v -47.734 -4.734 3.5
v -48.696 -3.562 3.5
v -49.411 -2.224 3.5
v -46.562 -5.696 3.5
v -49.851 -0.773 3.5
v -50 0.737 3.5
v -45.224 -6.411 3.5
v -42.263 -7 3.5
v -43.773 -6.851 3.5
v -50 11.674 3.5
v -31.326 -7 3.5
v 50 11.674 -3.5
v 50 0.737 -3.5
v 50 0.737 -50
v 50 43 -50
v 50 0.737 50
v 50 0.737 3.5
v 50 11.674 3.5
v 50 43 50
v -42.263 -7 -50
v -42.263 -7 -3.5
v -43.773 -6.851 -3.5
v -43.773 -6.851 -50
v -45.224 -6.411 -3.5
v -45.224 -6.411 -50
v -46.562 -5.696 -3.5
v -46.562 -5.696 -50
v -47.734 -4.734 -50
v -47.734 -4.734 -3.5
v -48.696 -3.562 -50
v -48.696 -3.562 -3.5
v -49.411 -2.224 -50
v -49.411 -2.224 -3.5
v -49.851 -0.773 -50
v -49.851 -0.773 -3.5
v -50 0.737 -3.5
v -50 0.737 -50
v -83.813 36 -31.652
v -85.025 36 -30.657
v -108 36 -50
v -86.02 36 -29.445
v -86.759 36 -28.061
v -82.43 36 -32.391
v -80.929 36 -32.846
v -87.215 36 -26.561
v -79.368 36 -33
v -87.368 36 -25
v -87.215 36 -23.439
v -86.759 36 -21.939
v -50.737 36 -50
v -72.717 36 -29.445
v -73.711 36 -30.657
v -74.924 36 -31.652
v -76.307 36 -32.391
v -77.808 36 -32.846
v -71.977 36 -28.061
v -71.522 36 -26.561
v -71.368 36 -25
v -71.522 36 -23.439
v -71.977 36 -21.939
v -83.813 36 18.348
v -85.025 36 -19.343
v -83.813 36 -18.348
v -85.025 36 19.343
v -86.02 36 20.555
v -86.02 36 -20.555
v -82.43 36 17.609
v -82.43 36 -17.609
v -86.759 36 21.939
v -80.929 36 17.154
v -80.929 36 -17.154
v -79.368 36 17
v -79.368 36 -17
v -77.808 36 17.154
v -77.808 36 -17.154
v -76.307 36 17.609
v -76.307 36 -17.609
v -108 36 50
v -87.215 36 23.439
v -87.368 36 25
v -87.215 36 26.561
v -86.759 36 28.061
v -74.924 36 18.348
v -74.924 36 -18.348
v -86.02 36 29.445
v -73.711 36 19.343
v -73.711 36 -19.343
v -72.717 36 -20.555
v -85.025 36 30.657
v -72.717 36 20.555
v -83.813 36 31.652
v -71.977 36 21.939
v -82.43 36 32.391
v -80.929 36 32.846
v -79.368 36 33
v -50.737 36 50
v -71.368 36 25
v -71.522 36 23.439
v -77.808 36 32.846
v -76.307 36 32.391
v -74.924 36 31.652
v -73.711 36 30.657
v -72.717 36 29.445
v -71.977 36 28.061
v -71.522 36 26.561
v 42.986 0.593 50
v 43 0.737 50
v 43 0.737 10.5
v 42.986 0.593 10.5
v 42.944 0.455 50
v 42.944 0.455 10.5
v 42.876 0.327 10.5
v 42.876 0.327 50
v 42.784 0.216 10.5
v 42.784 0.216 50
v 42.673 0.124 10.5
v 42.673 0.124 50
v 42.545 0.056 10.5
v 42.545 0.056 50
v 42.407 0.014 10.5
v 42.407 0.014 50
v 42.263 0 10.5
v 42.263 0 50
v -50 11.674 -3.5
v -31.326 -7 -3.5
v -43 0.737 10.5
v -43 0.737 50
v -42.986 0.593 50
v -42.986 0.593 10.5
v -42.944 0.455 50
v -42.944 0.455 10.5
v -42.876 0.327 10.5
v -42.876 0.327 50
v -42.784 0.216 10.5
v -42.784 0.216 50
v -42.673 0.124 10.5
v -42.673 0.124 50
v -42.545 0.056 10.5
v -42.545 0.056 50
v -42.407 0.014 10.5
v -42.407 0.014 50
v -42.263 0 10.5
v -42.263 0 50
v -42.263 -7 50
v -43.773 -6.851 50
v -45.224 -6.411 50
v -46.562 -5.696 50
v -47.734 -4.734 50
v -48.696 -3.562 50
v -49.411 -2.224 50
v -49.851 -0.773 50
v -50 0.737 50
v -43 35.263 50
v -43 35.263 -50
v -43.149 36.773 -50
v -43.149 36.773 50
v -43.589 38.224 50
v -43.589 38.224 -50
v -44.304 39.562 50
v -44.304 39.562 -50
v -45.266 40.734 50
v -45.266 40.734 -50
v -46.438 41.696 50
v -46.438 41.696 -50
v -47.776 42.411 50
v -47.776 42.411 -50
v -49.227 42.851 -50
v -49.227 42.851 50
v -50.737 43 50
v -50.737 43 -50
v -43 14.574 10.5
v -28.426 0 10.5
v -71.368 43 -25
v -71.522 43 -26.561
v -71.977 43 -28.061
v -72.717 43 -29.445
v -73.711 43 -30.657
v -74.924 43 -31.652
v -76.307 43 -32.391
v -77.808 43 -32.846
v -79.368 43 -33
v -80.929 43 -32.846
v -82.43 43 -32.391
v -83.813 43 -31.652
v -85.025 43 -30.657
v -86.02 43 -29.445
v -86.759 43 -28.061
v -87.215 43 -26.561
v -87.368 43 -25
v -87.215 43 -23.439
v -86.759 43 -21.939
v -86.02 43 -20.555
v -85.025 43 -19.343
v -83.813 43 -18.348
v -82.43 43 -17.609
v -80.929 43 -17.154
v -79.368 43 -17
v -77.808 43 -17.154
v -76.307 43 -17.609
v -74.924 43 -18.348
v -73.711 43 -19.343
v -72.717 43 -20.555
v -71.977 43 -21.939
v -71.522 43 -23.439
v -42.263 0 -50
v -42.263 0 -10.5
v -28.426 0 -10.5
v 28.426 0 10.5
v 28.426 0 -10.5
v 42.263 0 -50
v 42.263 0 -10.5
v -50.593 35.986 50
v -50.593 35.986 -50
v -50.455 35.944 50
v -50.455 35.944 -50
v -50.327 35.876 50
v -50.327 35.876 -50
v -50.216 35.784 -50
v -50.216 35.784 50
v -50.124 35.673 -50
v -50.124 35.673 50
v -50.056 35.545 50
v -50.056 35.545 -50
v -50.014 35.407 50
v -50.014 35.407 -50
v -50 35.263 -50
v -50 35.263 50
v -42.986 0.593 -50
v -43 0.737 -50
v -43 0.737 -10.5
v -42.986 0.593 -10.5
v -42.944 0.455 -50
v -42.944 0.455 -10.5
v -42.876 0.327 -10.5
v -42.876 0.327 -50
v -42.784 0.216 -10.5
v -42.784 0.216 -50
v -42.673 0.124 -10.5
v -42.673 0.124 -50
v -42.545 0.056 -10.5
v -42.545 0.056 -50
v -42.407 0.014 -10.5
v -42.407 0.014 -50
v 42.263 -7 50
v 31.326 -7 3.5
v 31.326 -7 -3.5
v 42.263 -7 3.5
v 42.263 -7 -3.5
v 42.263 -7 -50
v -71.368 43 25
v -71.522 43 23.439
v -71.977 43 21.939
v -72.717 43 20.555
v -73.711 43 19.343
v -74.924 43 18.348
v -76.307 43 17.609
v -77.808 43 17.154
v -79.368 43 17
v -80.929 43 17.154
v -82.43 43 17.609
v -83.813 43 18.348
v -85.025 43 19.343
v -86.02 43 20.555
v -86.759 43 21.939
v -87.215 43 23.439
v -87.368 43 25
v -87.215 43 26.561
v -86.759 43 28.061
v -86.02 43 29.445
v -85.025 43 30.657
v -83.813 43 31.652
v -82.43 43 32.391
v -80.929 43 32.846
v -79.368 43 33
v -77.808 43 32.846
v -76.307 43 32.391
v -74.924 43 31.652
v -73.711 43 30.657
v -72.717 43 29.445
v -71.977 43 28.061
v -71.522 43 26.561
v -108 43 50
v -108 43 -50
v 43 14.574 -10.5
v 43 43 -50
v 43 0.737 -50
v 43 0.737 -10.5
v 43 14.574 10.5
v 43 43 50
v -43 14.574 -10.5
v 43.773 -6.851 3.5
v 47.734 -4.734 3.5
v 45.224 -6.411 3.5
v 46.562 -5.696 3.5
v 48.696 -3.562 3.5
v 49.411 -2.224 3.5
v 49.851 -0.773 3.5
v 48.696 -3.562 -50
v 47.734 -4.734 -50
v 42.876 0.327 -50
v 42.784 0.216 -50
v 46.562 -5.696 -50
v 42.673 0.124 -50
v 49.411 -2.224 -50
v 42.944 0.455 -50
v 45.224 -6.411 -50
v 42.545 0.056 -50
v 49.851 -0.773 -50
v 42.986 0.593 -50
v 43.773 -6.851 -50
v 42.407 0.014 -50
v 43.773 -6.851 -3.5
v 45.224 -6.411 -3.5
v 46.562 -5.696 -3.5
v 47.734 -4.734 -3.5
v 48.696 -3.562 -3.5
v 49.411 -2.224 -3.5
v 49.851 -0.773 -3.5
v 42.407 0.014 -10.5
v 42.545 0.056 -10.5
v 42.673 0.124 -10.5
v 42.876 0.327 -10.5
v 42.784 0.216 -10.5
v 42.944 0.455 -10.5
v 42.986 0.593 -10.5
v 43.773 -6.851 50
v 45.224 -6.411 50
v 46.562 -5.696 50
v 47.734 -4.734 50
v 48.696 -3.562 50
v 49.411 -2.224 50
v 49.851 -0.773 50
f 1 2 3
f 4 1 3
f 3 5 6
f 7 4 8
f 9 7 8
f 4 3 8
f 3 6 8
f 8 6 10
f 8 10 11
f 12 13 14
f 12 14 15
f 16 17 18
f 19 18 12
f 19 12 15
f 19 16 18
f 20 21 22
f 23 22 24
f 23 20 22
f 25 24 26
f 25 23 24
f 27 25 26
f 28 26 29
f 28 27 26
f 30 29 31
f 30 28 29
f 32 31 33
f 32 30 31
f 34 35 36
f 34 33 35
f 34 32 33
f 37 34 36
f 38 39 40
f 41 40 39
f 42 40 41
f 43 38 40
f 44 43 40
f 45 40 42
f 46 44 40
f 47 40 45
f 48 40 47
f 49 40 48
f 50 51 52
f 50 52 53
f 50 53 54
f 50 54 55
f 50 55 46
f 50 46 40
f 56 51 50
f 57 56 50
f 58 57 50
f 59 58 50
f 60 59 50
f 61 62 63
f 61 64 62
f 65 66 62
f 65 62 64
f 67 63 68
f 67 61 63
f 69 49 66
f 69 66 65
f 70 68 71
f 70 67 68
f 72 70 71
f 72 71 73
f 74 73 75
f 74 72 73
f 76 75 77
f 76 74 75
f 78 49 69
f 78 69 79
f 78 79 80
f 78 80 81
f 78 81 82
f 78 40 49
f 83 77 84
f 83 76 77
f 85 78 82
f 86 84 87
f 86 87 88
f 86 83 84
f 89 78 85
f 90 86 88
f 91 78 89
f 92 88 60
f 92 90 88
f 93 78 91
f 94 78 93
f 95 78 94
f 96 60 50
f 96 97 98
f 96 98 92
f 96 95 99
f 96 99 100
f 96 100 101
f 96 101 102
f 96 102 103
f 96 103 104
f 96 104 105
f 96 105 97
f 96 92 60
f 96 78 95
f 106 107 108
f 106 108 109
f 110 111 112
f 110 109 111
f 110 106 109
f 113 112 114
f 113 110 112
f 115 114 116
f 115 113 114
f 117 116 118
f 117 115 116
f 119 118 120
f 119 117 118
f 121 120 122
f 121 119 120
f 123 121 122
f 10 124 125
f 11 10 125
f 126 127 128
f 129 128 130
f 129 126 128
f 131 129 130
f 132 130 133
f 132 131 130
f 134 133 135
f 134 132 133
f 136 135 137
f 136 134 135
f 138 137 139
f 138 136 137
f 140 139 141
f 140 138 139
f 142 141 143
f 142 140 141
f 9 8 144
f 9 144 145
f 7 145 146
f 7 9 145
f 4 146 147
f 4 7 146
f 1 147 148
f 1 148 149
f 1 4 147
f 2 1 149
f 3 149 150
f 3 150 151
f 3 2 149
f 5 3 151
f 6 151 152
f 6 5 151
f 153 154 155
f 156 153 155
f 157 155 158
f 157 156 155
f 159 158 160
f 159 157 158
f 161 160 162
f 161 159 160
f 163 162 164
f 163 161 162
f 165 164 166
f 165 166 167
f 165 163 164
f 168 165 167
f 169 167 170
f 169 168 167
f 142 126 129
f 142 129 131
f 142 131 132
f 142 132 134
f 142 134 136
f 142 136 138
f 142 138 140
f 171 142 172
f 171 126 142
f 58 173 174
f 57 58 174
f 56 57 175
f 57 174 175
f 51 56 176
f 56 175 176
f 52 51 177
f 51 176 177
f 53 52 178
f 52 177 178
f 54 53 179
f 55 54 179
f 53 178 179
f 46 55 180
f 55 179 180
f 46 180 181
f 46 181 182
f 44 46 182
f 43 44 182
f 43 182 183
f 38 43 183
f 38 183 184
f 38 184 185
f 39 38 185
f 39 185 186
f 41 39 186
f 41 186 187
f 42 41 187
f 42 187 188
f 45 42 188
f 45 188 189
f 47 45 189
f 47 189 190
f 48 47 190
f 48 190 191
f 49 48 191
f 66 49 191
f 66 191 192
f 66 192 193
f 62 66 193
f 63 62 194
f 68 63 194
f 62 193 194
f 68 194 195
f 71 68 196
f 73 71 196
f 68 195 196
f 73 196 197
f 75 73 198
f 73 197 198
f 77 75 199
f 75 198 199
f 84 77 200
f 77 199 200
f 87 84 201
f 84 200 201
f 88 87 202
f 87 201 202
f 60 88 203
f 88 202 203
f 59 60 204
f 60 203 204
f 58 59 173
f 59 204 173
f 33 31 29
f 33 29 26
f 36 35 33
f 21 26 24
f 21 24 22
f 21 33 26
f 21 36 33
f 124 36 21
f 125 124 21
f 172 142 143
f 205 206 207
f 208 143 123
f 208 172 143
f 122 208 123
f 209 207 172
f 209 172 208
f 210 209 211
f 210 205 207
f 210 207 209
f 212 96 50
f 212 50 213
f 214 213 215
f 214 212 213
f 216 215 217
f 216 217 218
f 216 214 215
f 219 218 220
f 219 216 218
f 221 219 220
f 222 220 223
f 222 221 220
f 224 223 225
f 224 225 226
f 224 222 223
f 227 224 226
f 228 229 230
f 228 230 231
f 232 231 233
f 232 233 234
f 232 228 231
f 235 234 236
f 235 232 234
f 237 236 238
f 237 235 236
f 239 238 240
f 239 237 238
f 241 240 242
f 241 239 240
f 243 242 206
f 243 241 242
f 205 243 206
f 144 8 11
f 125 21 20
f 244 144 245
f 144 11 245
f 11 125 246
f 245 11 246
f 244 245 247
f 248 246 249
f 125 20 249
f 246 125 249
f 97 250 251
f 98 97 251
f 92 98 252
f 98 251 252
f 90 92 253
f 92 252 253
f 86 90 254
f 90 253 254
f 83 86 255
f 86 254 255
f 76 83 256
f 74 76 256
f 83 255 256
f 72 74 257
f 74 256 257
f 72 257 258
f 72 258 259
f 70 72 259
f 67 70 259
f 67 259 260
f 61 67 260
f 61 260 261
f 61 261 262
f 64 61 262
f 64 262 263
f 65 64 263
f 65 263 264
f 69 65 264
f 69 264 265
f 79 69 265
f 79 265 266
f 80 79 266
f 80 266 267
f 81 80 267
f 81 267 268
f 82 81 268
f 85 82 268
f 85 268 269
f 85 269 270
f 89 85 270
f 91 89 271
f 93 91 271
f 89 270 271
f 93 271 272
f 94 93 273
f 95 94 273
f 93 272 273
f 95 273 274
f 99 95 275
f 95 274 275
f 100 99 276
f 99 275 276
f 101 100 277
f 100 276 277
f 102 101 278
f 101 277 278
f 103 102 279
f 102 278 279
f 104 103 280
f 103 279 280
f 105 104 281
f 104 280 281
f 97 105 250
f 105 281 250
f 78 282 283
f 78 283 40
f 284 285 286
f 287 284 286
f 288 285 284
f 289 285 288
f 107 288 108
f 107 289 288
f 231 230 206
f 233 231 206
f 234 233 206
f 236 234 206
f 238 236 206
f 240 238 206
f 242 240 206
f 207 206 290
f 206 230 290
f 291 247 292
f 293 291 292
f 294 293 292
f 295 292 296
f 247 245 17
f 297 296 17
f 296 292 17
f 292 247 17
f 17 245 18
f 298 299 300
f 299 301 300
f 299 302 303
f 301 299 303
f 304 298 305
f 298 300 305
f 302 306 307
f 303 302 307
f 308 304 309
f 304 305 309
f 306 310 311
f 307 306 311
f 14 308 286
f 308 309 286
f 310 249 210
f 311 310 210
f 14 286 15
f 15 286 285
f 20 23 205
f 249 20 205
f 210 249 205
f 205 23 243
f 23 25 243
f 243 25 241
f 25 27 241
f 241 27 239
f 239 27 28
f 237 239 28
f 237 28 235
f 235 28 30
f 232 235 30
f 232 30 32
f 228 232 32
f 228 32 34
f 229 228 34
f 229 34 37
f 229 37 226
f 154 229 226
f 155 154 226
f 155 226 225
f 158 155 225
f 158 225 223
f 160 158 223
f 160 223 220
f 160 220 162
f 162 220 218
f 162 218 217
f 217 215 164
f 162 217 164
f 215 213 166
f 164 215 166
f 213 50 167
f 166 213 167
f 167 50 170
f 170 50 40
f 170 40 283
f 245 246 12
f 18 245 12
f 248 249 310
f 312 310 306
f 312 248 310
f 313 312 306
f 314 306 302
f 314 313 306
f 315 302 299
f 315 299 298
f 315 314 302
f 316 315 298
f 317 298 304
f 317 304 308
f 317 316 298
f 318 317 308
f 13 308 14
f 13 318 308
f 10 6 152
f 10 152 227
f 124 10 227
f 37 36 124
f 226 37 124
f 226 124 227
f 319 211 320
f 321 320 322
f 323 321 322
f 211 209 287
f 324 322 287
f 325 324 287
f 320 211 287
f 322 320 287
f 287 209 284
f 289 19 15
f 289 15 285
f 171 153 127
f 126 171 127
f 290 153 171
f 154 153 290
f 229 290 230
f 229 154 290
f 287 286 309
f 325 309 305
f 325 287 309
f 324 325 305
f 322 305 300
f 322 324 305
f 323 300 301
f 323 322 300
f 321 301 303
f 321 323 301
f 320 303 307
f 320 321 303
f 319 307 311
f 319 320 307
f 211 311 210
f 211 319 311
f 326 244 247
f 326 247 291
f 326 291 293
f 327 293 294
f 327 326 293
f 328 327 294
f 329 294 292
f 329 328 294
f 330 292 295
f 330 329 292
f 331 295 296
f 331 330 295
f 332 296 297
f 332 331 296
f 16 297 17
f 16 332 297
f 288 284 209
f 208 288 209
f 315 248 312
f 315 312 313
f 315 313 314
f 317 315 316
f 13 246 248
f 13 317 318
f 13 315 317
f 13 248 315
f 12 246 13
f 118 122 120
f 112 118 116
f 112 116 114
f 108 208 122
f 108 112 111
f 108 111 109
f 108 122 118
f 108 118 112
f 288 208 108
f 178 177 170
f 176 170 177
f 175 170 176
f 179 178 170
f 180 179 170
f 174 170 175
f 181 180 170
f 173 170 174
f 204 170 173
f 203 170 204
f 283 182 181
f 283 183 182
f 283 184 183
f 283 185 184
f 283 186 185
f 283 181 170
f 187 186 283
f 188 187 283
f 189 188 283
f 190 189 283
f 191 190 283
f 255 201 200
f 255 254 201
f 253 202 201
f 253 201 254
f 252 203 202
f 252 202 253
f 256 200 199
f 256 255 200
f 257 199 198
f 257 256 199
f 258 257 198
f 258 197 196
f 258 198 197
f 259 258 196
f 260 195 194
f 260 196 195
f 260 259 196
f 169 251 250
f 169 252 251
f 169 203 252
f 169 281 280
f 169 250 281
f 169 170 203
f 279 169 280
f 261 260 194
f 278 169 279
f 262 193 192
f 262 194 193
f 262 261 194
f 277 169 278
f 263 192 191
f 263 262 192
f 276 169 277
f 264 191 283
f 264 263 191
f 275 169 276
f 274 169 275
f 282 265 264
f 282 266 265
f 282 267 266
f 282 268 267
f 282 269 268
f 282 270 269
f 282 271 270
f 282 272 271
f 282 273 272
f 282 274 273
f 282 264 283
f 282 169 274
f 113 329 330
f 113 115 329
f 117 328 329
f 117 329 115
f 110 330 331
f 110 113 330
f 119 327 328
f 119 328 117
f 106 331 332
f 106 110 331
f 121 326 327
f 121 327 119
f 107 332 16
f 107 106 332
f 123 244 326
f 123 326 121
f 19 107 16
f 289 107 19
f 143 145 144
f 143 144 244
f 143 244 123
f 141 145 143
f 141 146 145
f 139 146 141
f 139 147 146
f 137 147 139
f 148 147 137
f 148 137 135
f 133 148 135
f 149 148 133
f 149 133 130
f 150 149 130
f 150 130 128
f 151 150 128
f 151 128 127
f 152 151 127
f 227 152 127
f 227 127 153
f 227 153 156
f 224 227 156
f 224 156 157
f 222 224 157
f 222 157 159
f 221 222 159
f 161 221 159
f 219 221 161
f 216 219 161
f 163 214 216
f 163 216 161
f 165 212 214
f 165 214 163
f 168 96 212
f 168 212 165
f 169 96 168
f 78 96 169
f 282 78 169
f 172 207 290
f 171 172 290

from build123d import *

# Parameters (mm, degrees)
SKETCH1_W                      = 100
SKETCH1_H                      = 100
BASE_FLANGE1_DEPTH             = 7
EDGE_FLANGE1_STRIP_W           = 29.4732
EDGE_FLANGE1_STRIP_H           = 7
EDGE_FLANGE1_STRIP_CUT_DEPTH   = 100
EDGE_FLANGE1_STRIP_2_W         = 29.4732
EDGE_FLANGE1_STRIP_2_H         = 7
EDGE_FLANGE1_STRIP_CUT_2_DEPTH = 100
EDGE_FLANGE1_DEPTH             = 100
EDGE_FLANGE1_BEND_DEPTH        = 100
SHEET_START                    = -3.5
SHEET_METAL_GUSSET13_DEPTH     = 7
SHEET_START_2                  = -10.5
SHEET_METAL_GUSSET13_2_DEPTH   = 21
SHEET_METAL_GUSSET13_3_DEPTH   = 7
SHEET_START_3                  = 3.5
SHEET_METAL_GUSSET13_4_DEPTH   = 7
SHEET_METAL_GUSSET14_DEPTH     = 7
SHEET_METAL_GUSSET14_2_DEPTH   = 21
SHEET_METAL_GUSSET14_3_DEPTH   = 7
SHEET_METAL_GUSSET14_4_DEPTH   = 7
EDGE_FLANGE3_STRIP_W           = 29.4732
EDGE_FLANGE3_STRIP_H           = 7
EDGE_FLANGE3_STRIP_CUT_DEPTH   = 100
EDGE_FLANGE3_DEPTH             = 100
F_16_0MM_DOWEL_HOLE1_D         = 16


# Read off the part's stored shape, not the designer's step: Sheet Metal Gusset13, Sheet Metal Gusset14
# Sheet-metal steps are written as plain solids
with BuildPart() as part:
    # Sketch1 → Base-Flange1 (new body)
    with BuildSketch(Plane(origin=(0, 0, 0), x_dir=(1, 0, 0), z_dir=(0, 1, 0))):
        Rectangle(SKETCH1_W, SKETCH1_H)
    extrude(amount=-BASE_FLANGE1_DEPTH)

    # Edge-Flange1 strip (across the edge) → Edge-Flange1 strip cut (cut)
    with BuildSketch(Plane(origin=(-50, 0, -50), x_dir=(1, 0, 0), z_dir=(0, 0, 1))):
        with Locations((-7, -3.5)):
            Rectangle(EDGE_FLANGE1_STRIP_W, EDGE_FLANGE1_STRIP_H)
    extrude(amount=EDGE_FLANGE1_STRIP_CUT_DEPTH, mode=Mode.SUBTRACT)

    # Edge-Flange1 strip 2 (across the edge) → Edge-Flange1 strip cut 2 (cut)
    with BuildSketch(Plane(origin=(50, 0, 50), x_dir=(-1, 0, 0), z_dir=(0, 0, -1))):
        with Locations((-7, -3.5)):
            Rectangle(EDGE_FLANGE1_STRIP_2_W, EDGE_FLANGE1_STRIP_2_H)
    extrude(amount=EDGE_FLANGE1_STRIP_CUT_2_DEPTH, mode=Mode.SUBTRACT)

    # Edge-Flange1 section (across the edge) → Edge-Flange1 (add)
    with BuildSketch(Plane(origin=(-50, 0, -50), x_dir=(1, 0, 0), z_dir=(0, 0, 1))):
        with BuildLine():
            Line((0, 0.7366), (0, 43))
            Line((0, 43), (7, 43))
            Line((7, 43), (7, 0.7366))
            ThreePointArc((7, 0.7366), (7.215745145, 0.215745145), (7.7366, 0))
            Line((7.7366, 0), (7.7366, -7))
            ThreePointArc((7.7366, -7), (2.265997677, -4.734002323), (0, 0.7366))
        make_face()
    extrude(amount=EDGE_FLANGE1_DEPTH)

    # Edge-Flange1 section 2 (across the edge) → Edge-Flange1 bend (add)
    with BuildSketch(Plane(origin=(50, 0, 50), x_dir=(-1, 0, 0), z_dir=(0, 0, -1))):
        with BuildLine():
            Line((0, 0.7366), (0, 43))
            Line((0, 43), (7, 43))
            Line((7, 43), (7, 0.7366))
            ThreePointArc((7, 0.7366), (7.215745145, 0.215745145), (7.7366, 0))
            Line((7.7366, 0), (7.7366, -7))
            ThreePointArc((7.7366, -7), (2.265997677, -4.734002323), (0, 0.7366))
        make_face()
    extrude(amount=EDGE_FLANGE1_BEND_DEPTH)

    # Sheet Metal Gusset13 outline → Sheet Metal Gusset13 (cut)
    with BuildSketch(Plane.XY.offset(SHEET_START)):
        with BuildLine():
            Line((42.2634, 0), (38.325869023, 0))
            Line((38.325869023, 0), (31.325869023, -7))
            Line((31.325869023, -7), (42.2634, -7))
            ThreePointArc((42.2634, -7), (47.734002323, -4.734002323), (50, 0.7366))
            Line((50, 0.7366), (50, 11.674130977))
            Line((50, 11.674130977), (43, 4.674130977))
            Line((43, 4.674130977), (43, 0.7366))
            ThreePointArc((43, 0.7366), (42.784254855, 0.215745145), (42.2634, 0))
        make_face()
    extrude(amount=SHEET_METAL_GUSSET13_DEPTH, mode=Mode.SUBTRACT)

    # Sheet Metal Gusset13 2 outline → Sheet Metal Gusset13 2 (add)
    with BuildSketch(Plane.XY.offset(SHEET_START_2)):
        Polygon((43, 14.573625914), (28.426374086, 0), (38.325869023, 0), (43, 4.674130977), align=None)
    extrude(amount=SHEET_METAL_GUSSET13_2_DEPTH)

    # Sheet Metal Gusset13 3 outline → Sheet Metal Gusset13 3 (add)
    with BuildSketch(Plane.XY.offset(SHEET_START_2)):
        with BuildLine():
            Line((43, 4.674130977), (38.325869023, 0))
            Line((38.325869023, 0), (42.2634, 0))
            ThreePointArc((42.2634, 0), (42.784254855, 0.215745145), (43, 0.7366))
            Line((43, 0.7366), (43, 4.674130977))
        make_face()
    extrude(amount=SHEET_METAL_GUSSET13_3_DEPTH)

    # Sheet Metal Gusset13 4 outline → Sheet Metal Gusset13 4 (add)
    with BuildSketch(Plane.XY.offset(SHEET_START_3)):
        with BuildLine():
            Line((43, 4.674130977), (38.325869023, 0))
            Line((38.325869023, 0), (42.2634, 0))
            ThreePointArc((42.2634, 0), (42.784254855, 0.215745145), (43, 0.7366))
            Line((43, 0.7366), (43, 4.674130977))
        make_face()
    extrude(amount=SHEET_METAL_GUSSET13_4_DEPTH)

    # Sheet Metal Gusset14 outline → Sheet Metal Gusset14 (cut)
    with BuildSketch(Plane.XY.offset(SHEET_START)):
        with BuildLine():
            Line((-43, 0.7366), (-43, 4.674130977))
            Line((-43, 4.674130977), (-50, 11.674130977))
            Line((-50, 11.674130977), (-50, 0.7366))
            ThreePointArc((-50, 0.7366), (-47.734002323, -4.734002323), (-42.2634, -7))
            Line((-42.2634, -7), (-31.325869023, -7))
            Line((-31.325869023, -7), (-38.325869023, 0))
            Line((-38.325869023, 0), (-42.2634, 0))
            ThreePointArc((-42.2634, 0), (-42.784254855, 0.215745145), (-43, 0.7366))
        make_face()
    extrude(amount=SHEET_METAL_GUSSET14_DEPTH, mode=Mode.SUBTRACT)

    # Sheet Metal Gusset14 2 outline → Sheet Metal Gusset14 2 (add)
    with BuildSketch(Plane.XY.offset(SHEET_START_2)):
        Polygon((-28.426374086, 0), (-43, 14.573625914), (-43, 4.674130977), (-38.325869023, 0), align=None)
    extrude(amount=SHEET_METAL_GUSSET14_2_DEPTH)

    # Sheet Metal Gusset14 3 outline → Sheet Metal Gusset14 3 (add)
    with BuildSketch(Plane.XY.offset(SHEET_START_2)):
        with BuildLine():
            Line((-38.325869023, 0), (-43, 4.674130977))
            Line((-43, 4.674130977), (-43, 0.7366))
            ThreePointArc((-43, 0.7366), (-42.784254855, 0.215745145), (-42.2634, 0))
            Line((-42.2634, 0), (-38.325869023, 0))
        make_face()
    extrude(amount=SHEET_METAL_GUSSET14_3_DEPTH)

    # Sheet Metal Gusset14 4 outline → Sheet Metal Gusset14 4 (add)
    with BuildSketch(Plane.XY.offset(SHEET_START_3)):
        with BuildLine():
            Line((-38.325869023, 0), (-43, 4.674130977))
            Line((-43, 4.674130977), (-43, 0.7366))
            ThreePointArc((-43, 0.7366), (-42.784254855, 0.215745145), (-42.2634, 0))
            Line((-42.2634, 0), (-38.325869023, 0))
        make_face()
    extrude(amount=SHEET_METAL_GUSSET14_4_DEPTH)

    # Edge-Flange3 strip (across the edge) → Edge-Flange3 strip cut (cut)
    with BuildSketch(Plane(origin=(-50, 43, 50), x_dir=(0, -1, 0), z_dir=(0, 0, -1))):
        with Locations((-7, -3.5)):
            Rectangle(EDGE_FLANGE3_STRIP_W, EDGE_FLANGE3_STRIP_H)
    extrude(amount=EDGE_FLANGE3_STRIP_CUT_DEPTH, mode=Mode.SUBTRACT)

    # Edge-Flange3 section (across the edge) → Edge-Flange3 (add)
    with BuildSketch(Plane(origin=(-50, 43, 50), x_dir=(0, -1, 0), z_dir=(0, 0, -1))):
        with BuildLine():
            Line((0, 0.7366), (0, 58))
            Line((0, 58), (7, 58))
            Line((7, 58), (7, 0.7366))
            ThreePointArc((7, 0.7366), (7.215745145, 0.215745145), (7.7366, 0))
            Line((7.7366, 0), (7.7366, -7))
            ThreePointArc((7.7366, -7), (2.265997677, -4.734002323), (0, 0.7366))
        make_face()
    extrude(amount=EDGE_FLANGE3_DEPTH)

    # Ø16.0mm Dowel Hole1 (through all)
    with Locations(Plane(origin=(0, 36, 0), x_dir=(-1, 0, 0), z_dir=(0, -1, 0))):
        with Locations((79.3683, -25), (79.3683, 25)):
            Hole(F_16_0MM_DOWEL_HOLE1_D / 2)


solid = part.part
